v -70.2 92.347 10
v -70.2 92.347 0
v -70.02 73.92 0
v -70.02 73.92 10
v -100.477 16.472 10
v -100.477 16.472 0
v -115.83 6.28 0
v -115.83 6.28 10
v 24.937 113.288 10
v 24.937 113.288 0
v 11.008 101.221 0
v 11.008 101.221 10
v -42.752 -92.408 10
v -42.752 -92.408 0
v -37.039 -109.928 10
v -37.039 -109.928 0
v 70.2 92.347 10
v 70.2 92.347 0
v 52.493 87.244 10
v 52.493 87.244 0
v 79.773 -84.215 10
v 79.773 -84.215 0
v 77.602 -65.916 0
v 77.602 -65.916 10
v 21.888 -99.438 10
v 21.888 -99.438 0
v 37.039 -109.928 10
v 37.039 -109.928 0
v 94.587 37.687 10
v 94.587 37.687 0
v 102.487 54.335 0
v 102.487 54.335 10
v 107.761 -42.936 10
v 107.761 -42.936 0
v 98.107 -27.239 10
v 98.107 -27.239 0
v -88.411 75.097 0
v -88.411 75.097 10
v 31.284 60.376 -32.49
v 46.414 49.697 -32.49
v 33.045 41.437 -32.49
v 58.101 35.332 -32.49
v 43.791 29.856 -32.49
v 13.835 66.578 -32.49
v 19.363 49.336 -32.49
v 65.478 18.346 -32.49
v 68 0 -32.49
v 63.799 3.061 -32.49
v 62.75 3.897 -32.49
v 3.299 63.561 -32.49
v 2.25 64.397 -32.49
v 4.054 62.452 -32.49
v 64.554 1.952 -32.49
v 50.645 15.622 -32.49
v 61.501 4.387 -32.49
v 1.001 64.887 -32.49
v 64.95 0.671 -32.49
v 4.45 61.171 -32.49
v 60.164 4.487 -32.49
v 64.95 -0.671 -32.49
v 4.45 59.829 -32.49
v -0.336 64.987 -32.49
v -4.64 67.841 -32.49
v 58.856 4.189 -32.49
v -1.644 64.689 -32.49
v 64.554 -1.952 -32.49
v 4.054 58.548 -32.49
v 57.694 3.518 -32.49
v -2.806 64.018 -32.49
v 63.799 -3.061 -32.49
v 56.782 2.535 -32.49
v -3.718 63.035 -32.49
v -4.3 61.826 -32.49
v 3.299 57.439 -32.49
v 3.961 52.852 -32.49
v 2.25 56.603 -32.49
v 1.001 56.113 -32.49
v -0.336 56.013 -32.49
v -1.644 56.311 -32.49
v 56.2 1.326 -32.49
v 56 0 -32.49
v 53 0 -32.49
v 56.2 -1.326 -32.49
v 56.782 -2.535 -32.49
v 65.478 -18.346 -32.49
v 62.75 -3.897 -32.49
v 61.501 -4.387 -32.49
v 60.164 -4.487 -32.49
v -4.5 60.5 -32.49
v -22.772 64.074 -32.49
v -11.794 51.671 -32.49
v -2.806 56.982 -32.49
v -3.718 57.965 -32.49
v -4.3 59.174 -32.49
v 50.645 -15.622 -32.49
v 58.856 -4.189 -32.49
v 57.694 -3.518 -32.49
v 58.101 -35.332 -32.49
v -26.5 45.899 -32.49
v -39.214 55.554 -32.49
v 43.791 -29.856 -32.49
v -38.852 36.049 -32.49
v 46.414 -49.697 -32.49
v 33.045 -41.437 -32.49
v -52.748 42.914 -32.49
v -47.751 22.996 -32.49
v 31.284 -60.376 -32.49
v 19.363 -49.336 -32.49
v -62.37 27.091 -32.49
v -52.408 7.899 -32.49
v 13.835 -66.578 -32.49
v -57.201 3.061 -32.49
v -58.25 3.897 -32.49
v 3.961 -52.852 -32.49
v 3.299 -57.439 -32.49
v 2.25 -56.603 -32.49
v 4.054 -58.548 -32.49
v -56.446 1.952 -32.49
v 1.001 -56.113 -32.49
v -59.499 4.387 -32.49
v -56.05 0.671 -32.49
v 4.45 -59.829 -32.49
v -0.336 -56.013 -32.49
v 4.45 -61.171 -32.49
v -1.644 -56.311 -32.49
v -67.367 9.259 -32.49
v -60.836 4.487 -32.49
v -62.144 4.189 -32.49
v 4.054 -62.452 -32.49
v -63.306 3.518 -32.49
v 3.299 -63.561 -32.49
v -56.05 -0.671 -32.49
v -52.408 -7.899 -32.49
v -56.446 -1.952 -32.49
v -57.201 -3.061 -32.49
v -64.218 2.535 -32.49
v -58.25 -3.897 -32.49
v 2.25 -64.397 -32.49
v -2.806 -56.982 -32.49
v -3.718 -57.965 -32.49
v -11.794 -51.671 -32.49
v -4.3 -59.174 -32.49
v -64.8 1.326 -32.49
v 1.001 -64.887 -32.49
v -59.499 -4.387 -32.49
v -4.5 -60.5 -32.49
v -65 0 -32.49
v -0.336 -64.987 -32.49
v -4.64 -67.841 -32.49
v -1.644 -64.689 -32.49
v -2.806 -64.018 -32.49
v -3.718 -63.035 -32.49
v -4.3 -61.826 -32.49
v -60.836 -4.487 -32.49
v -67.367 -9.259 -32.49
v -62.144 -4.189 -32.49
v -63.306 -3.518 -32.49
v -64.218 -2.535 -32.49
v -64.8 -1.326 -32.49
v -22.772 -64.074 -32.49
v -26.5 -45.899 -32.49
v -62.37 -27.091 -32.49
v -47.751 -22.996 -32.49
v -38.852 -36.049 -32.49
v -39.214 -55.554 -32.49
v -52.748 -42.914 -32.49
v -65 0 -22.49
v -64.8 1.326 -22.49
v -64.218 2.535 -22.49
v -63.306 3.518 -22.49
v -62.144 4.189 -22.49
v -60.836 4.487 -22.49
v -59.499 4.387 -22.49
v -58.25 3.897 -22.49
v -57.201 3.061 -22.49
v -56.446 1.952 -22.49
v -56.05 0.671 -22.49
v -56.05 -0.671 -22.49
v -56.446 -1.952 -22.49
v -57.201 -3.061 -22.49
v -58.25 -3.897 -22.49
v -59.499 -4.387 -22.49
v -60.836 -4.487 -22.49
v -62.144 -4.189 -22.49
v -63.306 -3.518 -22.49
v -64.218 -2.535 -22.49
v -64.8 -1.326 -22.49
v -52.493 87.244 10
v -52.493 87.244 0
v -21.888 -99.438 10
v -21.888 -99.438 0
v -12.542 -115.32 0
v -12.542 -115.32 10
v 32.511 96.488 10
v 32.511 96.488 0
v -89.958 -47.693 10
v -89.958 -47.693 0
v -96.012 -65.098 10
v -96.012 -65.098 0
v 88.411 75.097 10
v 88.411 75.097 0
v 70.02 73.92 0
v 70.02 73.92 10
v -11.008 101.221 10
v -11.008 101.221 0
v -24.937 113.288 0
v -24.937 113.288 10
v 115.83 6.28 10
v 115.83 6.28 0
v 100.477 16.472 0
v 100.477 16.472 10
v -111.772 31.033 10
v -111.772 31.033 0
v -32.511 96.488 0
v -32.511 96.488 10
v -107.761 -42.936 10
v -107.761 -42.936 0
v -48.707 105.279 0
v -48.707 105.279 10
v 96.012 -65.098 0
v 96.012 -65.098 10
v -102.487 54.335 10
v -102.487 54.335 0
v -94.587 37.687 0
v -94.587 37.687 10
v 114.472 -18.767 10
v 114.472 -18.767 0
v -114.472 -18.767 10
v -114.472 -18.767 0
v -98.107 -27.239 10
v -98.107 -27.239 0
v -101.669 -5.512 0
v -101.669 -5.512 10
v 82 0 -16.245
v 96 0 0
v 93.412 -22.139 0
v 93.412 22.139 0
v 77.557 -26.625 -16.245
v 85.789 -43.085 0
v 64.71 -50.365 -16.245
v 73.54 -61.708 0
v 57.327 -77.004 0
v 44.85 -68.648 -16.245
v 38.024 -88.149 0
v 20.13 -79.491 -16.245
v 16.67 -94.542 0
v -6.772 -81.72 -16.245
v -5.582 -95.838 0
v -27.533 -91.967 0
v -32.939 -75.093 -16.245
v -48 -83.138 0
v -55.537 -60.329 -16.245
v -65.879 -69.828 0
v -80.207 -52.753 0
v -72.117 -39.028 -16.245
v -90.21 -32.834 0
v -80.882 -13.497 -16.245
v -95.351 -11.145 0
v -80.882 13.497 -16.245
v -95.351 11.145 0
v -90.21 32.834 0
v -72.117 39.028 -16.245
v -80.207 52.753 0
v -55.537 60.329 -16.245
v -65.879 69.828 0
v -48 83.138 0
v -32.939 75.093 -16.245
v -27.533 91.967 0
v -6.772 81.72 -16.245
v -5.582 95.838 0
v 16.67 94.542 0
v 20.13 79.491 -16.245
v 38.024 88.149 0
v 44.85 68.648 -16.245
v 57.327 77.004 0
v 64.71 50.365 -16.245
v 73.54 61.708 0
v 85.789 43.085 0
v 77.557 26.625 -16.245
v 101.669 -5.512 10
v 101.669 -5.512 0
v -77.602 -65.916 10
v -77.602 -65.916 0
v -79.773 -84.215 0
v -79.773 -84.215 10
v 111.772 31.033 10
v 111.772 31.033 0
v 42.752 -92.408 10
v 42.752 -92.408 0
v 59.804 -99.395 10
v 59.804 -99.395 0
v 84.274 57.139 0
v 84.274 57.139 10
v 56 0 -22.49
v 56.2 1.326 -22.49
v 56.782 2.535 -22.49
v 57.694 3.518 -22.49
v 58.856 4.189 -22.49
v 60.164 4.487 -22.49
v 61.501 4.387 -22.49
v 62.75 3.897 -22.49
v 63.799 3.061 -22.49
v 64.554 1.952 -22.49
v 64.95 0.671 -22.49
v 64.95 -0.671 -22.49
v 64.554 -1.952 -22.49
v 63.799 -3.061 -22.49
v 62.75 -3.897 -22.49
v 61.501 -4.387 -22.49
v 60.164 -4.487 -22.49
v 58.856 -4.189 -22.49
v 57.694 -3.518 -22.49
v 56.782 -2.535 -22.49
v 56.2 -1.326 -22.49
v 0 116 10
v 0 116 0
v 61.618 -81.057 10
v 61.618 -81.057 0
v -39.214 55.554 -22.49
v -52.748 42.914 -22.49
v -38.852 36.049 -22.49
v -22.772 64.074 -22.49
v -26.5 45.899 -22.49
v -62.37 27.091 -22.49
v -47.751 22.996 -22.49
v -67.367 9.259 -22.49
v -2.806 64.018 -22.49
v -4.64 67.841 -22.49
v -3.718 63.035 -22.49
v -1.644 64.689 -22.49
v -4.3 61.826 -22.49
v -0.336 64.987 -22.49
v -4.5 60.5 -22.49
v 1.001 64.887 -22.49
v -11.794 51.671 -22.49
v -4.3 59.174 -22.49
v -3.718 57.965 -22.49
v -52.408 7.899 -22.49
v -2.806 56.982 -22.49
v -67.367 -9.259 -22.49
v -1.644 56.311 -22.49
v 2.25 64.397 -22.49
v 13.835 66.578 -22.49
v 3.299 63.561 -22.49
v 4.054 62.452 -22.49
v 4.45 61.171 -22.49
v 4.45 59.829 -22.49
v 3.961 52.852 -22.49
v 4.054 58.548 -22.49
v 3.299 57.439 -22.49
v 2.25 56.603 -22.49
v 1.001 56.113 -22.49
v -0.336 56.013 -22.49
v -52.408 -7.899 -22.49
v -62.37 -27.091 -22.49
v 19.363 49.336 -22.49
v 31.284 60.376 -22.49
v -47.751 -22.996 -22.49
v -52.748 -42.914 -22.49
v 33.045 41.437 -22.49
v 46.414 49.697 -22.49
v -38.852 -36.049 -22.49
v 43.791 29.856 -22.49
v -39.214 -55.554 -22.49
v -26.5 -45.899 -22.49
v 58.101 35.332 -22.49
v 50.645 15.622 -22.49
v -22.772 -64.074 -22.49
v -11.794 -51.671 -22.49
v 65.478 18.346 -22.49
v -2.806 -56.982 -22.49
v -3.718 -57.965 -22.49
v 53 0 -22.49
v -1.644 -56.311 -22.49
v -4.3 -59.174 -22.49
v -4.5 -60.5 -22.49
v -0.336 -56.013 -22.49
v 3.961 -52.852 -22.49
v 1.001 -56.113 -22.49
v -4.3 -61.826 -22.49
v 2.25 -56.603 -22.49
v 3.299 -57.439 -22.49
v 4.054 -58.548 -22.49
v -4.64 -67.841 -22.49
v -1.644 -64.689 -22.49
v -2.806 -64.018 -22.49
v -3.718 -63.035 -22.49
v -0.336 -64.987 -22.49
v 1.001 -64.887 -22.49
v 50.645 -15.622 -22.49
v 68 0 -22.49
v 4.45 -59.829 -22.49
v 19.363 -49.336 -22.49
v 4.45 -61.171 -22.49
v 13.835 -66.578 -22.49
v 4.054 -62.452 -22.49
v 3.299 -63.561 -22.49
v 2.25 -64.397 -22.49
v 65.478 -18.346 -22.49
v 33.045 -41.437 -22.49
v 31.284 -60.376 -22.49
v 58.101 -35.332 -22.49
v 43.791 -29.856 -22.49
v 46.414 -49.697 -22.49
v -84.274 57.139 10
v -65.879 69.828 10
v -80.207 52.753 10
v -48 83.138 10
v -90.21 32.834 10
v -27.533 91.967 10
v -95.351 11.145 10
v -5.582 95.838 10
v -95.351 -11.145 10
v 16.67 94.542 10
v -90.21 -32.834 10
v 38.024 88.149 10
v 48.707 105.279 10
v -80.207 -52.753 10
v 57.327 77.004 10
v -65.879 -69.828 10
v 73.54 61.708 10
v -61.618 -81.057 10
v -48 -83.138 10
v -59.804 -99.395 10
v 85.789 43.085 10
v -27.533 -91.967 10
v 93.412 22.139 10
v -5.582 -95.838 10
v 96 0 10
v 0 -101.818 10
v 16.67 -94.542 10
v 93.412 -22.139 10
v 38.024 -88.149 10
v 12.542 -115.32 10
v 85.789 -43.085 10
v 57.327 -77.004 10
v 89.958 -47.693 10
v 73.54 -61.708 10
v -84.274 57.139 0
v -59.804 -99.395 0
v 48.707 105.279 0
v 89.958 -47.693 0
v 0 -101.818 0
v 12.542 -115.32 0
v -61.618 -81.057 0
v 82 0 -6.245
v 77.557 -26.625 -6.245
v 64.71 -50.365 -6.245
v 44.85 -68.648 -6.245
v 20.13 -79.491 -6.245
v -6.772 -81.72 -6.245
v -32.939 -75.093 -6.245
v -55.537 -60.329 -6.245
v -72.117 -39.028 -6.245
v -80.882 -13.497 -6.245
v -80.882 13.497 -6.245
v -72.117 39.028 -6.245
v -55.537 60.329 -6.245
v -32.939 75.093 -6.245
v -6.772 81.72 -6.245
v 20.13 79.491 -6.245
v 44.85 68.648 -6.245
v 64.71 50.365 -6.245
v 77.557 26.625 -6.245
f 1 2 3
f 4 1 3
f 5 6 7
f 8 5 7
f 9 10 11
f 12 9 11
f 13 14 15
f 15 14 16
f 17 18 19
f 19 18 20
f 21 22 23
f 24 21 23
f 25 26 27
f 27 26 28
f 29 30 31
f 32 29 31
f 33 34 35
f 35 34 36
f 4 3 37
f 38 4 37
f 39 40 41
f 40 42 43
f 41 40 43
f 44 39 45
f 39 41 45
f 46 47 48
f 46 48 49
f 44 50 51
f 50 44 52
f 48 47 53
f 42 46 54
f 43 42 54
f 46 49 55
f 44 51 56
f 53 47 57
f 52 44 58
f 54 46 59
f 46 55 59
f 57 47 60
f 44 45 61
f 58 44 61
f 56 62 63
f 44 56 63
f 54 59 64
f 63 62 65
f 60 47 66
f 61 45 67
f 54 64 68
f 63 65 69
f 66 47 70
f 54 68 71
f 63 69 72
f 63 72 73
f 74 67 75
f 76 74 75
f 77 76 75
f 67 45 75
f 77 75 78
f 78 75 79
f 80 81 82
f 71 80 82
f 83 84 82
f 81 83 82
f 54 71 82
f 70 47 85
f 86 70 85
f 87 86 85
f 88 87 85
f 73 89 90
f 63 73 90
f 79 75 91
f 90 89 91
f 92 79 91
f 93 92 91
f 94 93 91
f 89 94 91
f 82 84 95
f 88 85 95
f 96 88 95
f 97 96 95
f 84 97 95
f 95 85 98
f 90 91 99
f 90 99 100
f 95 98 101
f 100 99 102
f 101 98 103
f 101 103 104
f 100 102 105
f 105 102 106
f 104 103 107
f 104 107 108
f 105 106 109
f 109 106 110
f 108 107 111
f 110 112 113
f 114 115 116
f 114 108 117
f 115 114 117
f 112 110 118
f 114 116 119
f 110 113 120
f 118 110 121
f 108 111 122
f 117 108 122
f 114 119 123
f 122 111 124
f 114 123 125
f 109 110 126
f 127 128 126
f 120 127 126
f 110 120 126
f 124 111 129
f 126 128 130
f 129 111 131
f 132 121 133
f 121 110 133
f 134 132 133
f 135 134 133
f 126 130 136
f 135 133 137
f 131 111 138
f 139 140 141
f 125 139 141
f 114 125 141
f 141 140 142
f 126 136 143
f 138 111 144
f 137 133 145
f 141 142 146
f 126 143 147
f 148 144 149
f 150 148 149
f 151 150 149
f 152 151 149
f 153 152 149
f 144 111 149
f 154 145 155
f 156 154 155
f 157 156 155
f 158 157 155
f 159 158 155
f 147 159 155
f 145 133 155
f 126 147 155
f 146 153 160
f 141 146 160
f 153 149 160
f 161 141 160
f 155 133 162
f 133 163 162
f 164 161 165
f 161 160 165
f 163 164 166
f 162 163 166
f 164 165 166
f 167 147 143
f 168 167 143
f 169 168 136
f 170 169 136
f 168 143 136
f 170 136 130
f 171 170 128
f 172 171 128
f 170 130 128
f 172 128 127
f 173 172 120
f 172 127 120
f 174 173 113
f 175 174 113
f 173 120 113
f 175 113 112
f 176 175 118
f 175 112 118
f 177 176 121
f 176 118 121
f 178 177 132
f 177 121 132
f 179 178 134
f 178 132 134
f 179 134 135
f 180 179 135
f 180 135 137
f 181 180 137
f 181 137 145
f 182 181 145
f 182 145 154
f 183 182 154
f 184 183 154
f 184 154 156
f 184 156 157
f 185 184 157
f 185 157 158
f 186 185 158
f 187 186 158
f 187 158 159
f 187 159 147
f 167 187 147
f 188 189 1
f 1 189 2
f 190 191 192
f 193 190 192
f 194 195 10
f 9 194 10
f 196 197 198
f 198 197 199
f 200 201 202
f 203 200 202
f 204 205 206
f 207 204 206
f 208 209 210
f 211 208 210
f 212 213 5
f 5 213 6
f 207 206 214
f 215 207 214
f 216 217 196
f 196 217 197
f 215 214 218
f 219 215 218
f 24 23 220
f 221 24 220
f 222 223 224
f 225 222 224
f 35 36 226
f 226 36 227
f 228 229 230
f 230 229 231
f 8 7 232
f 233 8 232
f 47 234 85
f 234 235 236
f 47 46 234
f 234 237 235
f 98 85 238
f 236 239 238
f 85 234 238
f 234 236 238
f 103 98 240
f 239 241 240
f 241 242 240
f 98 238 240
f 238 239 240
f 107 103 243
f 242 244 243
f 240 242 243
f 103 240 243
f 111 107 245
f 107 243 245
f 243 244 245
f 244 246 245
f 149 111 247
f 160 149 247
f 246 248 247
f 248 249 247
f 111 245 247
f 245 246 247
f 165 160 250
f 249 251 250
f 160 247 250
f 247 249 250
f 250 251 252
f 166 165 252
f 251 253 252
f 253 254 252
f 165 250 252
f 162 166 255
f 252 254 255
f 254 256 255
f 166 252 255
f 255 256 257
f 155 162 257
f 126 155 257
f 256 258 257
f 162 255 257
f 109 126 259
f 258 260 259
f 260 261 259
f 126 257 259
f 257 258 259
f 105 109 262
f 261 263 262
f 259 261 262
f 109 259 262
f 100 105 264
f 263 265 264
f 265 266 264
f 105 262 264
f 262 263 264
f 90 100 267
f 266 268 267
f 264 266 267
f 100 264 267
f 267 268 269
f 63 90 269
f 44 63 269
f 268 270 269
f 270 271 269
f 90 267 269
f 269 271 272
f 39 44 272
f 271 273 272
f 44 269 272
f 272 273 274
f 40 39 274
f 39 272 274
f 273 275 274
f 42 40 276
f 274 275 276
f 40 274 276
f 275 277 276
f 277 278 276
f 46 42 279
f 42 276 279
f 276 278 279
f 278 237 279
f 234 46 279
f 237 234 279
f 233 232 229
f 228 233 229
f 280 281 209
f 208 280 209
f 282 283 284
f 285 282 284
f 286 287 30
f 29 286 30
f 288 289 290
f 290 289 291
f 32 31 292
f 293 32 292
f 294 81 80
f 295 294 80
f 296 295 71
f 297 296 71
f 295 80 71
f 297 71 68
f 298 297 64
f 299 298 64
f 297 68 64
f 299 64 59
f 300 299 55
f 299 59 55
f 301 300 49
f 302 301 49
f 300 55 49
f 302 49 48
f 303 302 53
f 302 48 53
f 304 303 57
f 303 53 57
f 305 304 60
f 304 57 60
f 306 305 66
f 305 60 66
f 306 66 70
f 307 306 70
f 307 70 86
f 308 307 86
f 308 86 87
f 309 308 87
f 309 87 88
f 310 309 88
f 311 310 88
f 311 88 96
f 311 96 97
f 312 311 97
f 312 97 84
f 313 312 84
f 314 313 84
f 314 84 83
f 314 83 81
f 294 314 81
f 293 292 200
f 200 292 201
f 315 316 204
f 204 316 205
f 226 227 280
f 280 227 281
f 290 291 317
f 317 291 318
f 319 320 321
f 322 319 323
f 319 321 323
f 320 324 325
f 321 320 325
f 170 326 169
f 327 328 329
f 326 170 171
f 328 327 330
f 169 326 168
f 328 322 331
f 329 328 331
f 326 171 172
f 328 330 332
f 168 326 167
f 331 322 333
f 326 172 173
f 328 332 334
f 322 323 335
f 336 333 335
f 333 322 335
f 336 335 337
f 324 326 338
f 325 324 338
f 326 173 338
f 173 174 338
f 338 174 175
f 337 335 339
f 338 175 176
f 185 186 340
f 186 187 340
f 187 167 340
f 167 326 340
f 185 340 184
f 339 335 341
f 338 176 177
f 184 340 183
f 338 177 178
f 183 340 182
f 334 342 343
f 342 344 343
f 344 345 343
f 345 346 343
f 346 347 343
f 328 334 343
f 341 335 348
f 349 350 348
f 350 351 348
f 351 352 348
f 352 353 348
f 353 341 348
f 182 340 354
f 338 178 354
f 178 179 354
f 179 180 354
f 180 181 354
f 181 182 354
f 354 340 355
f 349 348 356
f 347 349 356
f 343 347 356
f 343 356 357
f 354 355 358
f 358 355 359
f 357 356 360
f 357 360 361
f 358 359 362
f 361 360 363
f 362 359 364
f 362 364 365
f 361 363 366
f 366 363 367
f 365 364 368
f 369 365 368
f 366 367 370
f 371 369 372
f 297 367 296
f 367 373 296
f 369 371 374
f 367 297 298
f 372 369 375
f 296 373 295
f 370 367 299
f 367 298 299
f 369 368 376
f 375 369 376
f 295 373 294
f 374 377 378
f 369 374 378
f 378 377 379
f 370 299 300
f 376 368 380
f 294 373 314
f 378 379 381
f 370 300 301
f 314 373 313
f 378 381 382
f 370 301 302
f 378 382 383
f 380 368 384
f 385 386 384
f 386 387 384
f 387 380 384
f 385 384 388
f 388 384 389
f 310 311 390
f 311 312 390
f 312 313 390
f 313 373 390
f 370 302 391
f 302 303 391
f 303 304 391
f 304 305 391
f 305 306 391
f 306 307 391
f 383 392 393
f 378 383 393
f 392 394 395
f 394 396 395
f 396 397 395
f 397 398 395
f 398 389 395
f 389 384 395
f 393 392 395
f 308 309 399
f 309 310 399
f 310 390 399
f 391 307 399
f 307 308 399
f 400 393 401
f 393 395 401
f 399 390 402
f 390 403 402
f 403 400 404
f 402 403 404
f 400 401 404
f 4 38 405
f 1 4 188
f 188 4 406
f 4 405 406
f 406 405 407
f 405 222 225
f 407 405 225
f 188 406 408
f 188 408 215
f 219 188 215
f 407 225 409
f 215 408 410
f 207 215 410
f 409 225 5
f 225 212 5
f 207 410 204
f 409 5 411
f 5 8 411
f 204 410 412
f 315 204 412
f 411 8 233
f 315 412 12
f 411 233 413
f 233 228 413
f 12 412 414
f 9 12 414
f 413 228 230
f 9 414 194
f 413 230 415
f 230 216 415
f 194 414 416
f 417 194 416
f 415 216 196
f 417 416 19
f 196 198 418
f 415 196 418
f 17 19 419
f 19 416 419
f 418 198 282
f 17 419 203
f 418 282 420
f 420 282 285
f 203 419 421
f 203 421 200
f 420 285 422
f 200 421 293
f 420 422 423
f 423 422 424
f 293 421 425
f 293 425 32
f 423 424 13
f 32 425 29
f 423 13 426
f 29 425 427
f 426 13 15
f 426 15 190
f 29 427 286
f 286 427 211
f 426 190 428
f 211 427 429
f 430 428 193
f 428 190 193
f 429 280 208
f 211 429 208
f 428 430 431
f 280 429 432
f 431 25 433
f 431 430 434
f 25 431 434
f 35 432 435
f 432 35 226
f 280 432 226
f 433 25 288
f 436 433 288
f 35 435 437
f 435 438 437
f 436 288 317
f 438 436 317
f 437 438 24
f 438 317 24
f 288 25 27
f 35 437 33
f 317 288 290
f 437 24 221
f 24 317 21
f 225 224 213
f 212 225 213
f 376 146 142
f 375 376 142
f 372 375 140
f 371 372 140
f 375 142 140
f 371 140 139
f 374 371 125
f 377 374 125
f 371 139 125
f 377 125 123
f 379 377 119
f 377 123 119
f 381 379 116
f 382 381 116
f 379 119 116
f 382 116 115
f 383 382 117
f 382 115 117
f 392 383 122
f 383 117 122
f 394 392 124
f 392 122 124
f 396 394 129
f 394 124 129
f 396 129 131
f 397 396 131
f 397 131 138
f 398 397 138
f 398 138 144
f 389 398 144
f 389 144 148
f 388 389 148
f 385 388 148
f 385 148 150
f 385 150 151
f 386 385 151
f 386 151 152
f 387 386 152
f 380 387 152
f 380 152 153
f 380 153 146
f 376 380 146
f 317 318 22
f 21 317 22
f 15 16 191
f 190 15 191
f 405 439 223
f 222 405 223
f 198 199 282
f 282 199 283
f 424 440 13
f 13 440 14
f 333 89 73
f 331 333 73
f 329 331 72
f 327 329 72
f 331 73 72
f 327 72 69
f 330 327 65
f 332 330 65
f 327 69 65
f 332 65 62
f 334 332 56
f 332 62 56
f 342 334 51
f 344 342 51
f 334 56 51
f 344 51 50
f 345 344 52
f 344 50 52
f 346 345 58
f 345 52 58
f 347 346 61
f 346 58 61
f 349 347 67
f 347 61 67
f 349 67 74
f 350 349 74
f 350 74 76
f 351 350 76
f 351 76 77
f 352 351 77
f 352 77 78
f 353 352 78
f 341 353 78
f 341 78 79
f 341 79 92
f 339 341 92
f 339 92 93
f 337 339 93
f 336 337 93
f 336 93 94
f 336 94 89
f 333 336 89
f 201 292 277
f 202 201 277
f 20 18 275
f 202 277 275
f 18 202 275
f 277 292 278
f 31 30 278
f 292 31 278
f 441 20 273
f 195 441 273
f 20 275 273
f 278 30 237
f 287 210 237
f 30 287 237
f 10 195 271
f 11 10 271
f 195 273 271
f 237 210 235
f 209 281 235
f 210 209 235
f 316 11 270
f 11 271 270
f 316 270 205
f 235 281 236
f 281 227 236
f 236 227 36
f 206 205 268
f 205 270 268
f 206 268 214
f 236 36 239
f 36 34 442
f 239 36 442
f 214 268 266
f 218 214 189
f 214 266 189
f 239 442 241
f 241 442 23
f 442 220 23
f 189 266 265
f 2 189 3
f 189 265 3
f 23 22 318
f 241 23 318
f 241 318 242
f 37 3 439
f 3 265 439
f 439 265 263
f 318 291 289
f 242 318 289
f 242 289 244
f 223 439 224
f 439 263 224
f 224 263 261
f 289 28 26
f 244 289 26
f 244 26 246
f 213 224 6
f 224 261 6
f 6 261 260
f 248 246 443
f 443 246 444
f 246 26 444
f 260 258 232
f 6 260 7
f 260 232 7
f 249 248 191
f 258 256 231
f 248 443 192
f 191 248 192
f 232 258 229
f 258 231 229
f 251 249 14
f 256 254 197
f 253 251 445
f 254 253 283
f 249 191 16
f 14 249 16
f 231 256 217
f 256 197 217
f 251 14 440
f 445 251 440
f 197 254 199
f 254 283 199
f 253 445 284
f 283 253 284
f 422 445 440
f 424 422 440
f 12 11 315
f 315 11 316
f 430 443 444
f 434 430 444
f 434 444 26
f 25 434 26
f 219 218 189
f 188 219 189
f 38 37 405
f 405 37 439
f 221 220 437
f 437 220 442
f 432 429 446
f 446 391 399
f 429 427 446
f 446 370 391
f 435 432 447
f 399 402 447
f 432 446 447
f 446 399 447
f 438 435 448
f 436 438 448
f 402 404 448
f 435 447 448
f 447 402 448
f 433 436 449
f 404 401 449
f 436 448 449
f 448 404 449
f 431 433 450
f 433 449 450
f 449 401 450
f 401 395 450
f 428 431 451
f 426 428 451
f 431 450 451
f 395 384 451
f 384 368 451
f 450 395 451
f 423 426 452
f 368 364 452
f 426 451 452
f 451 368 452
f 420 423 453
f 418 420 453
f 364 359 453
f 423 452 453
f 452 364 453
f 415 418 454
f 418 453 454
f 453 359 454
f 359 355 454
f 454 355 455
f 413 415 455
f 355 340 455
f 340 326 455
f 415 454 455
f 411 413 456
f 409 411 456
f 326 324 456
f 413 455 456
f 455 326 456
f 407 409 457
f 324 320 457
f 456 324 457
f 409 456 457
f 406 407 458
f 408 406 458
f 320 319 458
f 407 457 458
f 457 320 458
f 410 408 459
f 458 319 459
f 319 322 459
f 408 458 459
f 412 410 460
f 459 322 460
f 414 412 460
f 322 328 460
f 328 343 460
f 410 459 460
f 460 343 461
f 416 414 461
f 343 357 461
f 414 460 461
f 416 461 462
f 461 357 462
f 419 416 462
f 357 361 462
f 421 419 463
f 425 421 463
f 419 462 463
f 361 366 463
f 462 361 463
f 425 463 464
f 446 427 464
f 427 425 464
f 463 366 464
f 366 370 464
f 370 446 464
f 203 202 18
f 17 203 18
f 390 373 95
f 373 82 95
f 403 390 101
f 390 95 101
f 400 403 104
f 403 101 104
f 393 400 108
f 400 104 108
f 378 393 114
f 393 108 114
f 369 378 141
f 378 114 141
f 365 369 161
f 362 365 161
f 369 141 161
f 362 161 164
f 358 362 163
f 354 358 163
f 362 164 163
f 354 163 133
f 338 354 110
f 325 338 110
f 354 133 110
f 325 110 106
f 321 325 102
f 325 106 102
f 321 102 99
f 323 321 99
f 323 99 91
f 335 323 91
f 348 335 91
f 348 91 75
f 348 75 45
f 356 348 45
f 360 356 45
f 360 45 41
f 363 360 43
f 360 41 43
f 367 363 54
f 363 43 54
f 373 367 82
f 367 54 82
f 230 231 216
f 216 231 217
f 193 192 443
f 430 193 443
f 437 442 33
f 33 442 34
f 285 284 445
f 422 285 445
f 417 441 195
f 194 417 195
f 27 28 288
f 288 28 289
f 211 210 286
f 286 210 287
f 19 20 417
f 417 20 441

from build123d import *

# Parameters (mm, degrees)
BOSS_EXTRU_1_DEPTH           = 10
R_P_TITION_CIRCULAIRE1_COUNT = 29
ESQUISSE3_R                  = 100
ENL_V_MAT_EXTRU_1_DEPTH      = 165.2332493
D_GAGEMENT_M81_D             = 9


with BuildPart() as part:
    # Esquisse1 → Boss.-Extru.1 (new body)
    with BuildSketch(Plane.XY):
        Polygon((-11.173395042, 101), (0, 0), (11.173395042, 101), (0, 116), align=None)
    extrude(amount=BOSS_EXTRU_1_DEPTH)


with BuildPart() as r_p_tition_circulaire1_1:
    # Répétition circulaire1: pattern copy
    add(part.part.rotate(Axis((0, 0, 0), (0, 0, 1)), 1 * 360 / R_P_TITION_CIRCULAIRE1_COUNT))


with BuildPart() as r_p_tition_circulaire1_2:
    # Répétition circulaire1: pattern copy
    add(part.part.rotate(Axis((0, 0, 0), (0, 0, 1)), 2 * 360 / R_P_TITION_CIRCULAIRE1_COUNT))


with BuildPart() as r_p_tition_circulaire1_3:
    # Répétition circulaire1: pattern copy
    add(part.part.rotate(Axis((0, 0, 0), (0, 0, 1)), 3 * 360 / R_P_TITION_CIRCULAIRE1_COUNT))


with BuildPart() as r_p_tition_circulaire1_4:
    # Répétition circulaire1: pattern copy
    add(part.part.rotate(Axis((0, 0, 0), (0, 0, 1)), 4 * 360 / R_P_TITION_CIRCULAIRE1_COUNT))


with BuildPart() as r_p_tition_circulaire1_5:
    # Répétition circulaire1: pattern copy
    add(part.part.rotate(Axis((0, 0, 0), (0, 0, 1)), 5 * 360 / R_P_TITION_CIRCULAIRE1_COUNT))


with BuildPart() as r_p_tition_circulaire1_6:
    # Répétition circulaire1: pattern copy
    add(part.part.rotate(Axis((0, 0, 0), (0, 0, 1)), 6 * 360 / R_P_TITION_CIRCULAIRE1_COUNT))


with BuildPart() as r_p_tition_circulaire1_7:
    # Répétition circulaire1: pattern copy
    add(part.part.rotate(Axis((0, 0, 0), (0, 0, 1)), 7 * 360 / R_P_TITION_CIRCULAIRE1_COUNT))


with BuildPart() as r_p_tition_circulaire1_8:
    # Répétition circulaire1: pattern copy
    add(part.part.rotate(Axis((0, 0, 0), (0, 0, 1)), 8 * 360 / R_P_TITION_CIRCULAIRE1_COUNT))


with BuildPart() as r_p_tition_circulaire1_9:
    # Répétition circulaire1: pattern copy
    add(part.part.rotate(Axis((0, 0, 0), (0, 0, 1)), 9 * 360 / R_P_TITION_CIRCULAIRE1_COUNT))


with BuildPart() as r_p_tition_circulaire1_10:
    # Répétition circulaire1: pattern copy
    add(part.part.rotate(Axis((0, 0, 0), (0, 0, 1)), 10 * 360 / R_P_TITION_CIRCULAIRE1_COUNT))


with BuildPart() as r_p_tition_circulaire1_11:
    # Répétition circulaire1: pattern copy
    add(part.part.rotate(Axis((0, 0, 0), (0, 0, 1)), 11 * 360 / R_P_TITION_CIRCULAIRE1_COUNT))


with BuildPart() as r_p_tition_circulaire1_12:
    # Répétition circulaire1: pattern copy
    add(part.part.rotate(Axis((0, 0, 0), (0, 0, 1)), 12 * 360 / R_P_TITION_CIRCULAIRE1_COUNT))


with BuildPart() as r_p_tition_circulaire1_13:
    # Répétition circulaire1: pattern copy
    add(part.part.rotate(Axis((0, 0, 0), (0, 0, 1)), 13 * 360 / R_P_TITION_CIRCULAIRE1_COUNT))


with BuildPart() as r_p_tition_circulaire1_14:
    # Répétition circulaire1: pattern copy
    add(part.part.rotate(Axis((0, 0, 0), (0, 0, 1)), 14 * 360 / R_P_TITION_CIRCULAIRE1_COUNT))


with BuildPart() as r_p_tition_circulaire1_15:
    # Répétition circulaire1: pattern copy
    add(part.part.rotate(Axis((0, 0, 0), (0, 0, 1)), 15 * 360 / R_P_TITION_CIRCULAIRE1_COUNT))


with BuildPart() as r_p_tition_circulaire1_16:
    # Répétition circulaire1: pattern copy
    add(part.part.rotate(Axis((0, 0, 0), (0, 0, 1)), 16 * 360 / R_P_TITION_CIRCULAIRE1_COUNT))


with BuildPart() as r_p_tition_circulaire1_17:
    # Répétition circulaire1: pattern copy
    add(part.part.rotate(Axis((0, 0, 0), (0, 0, 1)), 17 * 360 / R_P_TITION_CIRCULAIRE1_COUNT))


with BuildPart() as r_p_tition_circulaire1_18:
    # Répétition circulaire1: pattern copy
    add(part.part.rotate(Axis((0, 0, 0), (0, 0, 1)), 18 * 360 / R_P_TITION_CIRCULAIRE1_COUNT))


with BuildPart() as r_p_tition_circulaire1_19:
    # Répétition circulaire1: pattern copy
    add(part.part.rotate(Axis((0, 0, 0), (0, 0, 1)), 19 * 360 / R_P_TITION_CIRCULAIRE1_COUNT))


with BuildPart() as r_p_tition_circulaire1_20:
    # Répétition circulaire1: pattern copy
    add(part.part.rotate(Axis((0, 0, 0), (0, 0, 1)), 20 * 360 / R_P_TITION_CIRCULAIRE1_COUNT))


with BuildPart() as r_p_tition_circulaire1_21:
    # Répétition circulaire1: pattern copy
    add(part.part.rotate(Axis((0, 0, 0), (0, 0, 1)), 21 * 360 / R_P_TITION_CIRCULAIRE1_COUNT))


with BuildPart() as r_p_tition_circulaire1_22:
    # Répétition circulaire1: pattern copy
    add(part.part.rotate(Axis((0, 0, 0), (0, 0, 1)), 22 * 360 / R_P_TITION_CIRCULAIRE1_COUNT))


with BuildPart() as r_p_tition_circulaire1_23:
    # Répétition circulaire1: pattern copy
    add(part.part.rotate(Axis((0, 0, 0), (0, 0, 1)), 23 * 360 / R_P_TITION_CIRCULAIRE1_COUNT))


with BuildPart() as r_p_tition_circulaire1_24:
    # Répétition circulaire1: pattern copy
    add(part.part.rotate(Axis((0, 0, 0), (0, 0, 1)), 24 * 360 / R_P_TITION_CIRCULAIRE1_COUNT))


with BuildPart() as r_p_tition_circulaire1_25:
    # Répétition circulaire1: pattern copy
    add(part.part.rotate(Axis((0, 0, 0), (0, 0, 1)), 25 * 360 / R_P_TITION_CIRCULAIRE1_COUNT))


with BuildPart() as r_p_tition_circulaire1_26:
    # Répétition circulaire1: pattern copy
    add(part.part.rotate(Axis((0, 0, 0), (0, 0, 1)), 26 * 360 / R_P_TITION_CIRCULAIRE1_COUNT))


with BuildPart() as r_p_tition_circulaire1_27:
    # Répétition circulaire1: pattern copy
    add(part.part.rotate(Axis((0, 0, 0), (0, 0, 1)), 27 * 360 / R_P_TITION_CIRCULAIRE1_COUNT))


with BuildPart() as r_p_tition_circulaire1_28:
    # Répétition circulaire1: pattern copy
    add(part.part.rotate(Axis((0, 0, 0), (0, 0, 1)), 28 * 360 / R_P_TITION_CIRCULAIRE1_COUNT))


with BuildPart() as enl_v_mat_extru_1_tool:
    # Esquisse3 → Enlèv. mat.-Extru.1 (new, through all)
    with BuildSketch(Plane.XY):
        Circle(ESQUISSE3_R)
    extrude(amount=ENL_V_MAT_EXTRU_1_DEPTH)


with BuildPart() as part_1:
    add(part.part)

    # Enlèv. mat.-Extru.1: cut by enl_v_mat_extru_1_tool
    add(enl_v_mat_extru_1_tool.part, mode=Mode.SUBTRACT)



with BuildPart() as r_p_tition_circulaire1_1_1:
    add(r_p_tition_circulaire1_1.part)

    # Enlèv. mat.-Extru.1: cut by enl_v_mat_extru_1_tool
    add(enl_v_mat_extru_1_tool.part, mode=Mode.SUBTRACT)


with BuildPart() as r_p_tition_circulaire1_2_1:
    add(r_p_tition_circulaire1_2.part)

    # Enlèv. mat.-Extru.1: cut by enl_v_mat_extru_1_tool
    add(enl_v_mat_extru_1_tool.part, mode=Mode.SUBTRACT)


with BuildPart() as r_p_tition_circulaire1_3_1:
    add(r_p_tition_circulaire1_3.part)

    # Enlèv. mat.-Extru.1: cut by enl_v_mat_extru_1_tool
    add(enl_v_mat_extru_1_tool.part, mode=Mode.SUBTRACT)


with BuildPart() as r_p_tition_circulaire1_4_1:
    add(r_p_tition_circulaire1_4.part)

    # Enlèv. mat.-Extru.1: cut by enl_v_mat_extru_1_tool
    add(enl_v_mat_extru_1_tool.part, mode=Mode.SUBTRACT)


with BuildPart() as r_p_tition_circulaire1_5_1:
    add(r_p_tition_circulaire1_5.part)

    # Enlèv. mat.-Extru.1: cut by enl_v_mat_extru_1_tool
    add(enl_v_mat_extru_1_tool.part, mode=Mode.SUBTRACT)


with BuildPart() as r_p_tition_circulaire1_6_1:
    add(r_p_tition_circulaire1_6.part)

    # Enlèv. mat.-Extru.1: cut by enl_v_mat_extru_1_tool
    add(enl_v_mat_extru_1_tool.part, mode=Mode.SUBTRACT)


with BuildPart() as r_p_tition_circulaire1_7_1:
    add(r_p_tition_circulaire1_7.part)

    # Enlèv. mat.-Extru.1: cut by enl_v_mat_extru_1_tool
    add(enl_v_mat_extru_1_tool.part, mode=Mode.SUBTRACT)


with BuildPart() as r_p_tition_circulaire1_8_1:
    add(r_p_tition_circulaire1_8.part)

    # Enlèv. mat.-Extru.1: cut by enl_v_mat_extru_1_tool
    add(enl_v_mat_extru_1_tool.part, mode=Mode.SUBTRACT)


with BuildPart() as r_p_tition_circulaire1_9_1:
    add(r_p_tition_circulaire1_9.part)

    # Enlèv. mat.-Extru.1: cut by enl_v_mat_extru_1_tool
    add(enl_v_mat_extru_1_tool.part, mode=Mode.SUBTRACT)


with BuildPart() as r_p_tition_circulaire1_10_1:
    add(r_p_tition_circulaire1_10.part)

    # Enlèv. mat.-Extru.1: cut by enl_v_mat_extru_1_tool
    add(enl_v_mat_extru_1_tool.part, mode=Mode.SUBTRACT)


with BuildPart() as r_p_tition_circulaire1_11_1:
    add(r_p_tition_circulaire1_11.part)

    # Enlèv. mat.-Extru.1: cut by enl_v_mat_extru_1_tool
    add(enl_v_mat_extru_1_tool.part, mode=Mode.SUBTRACT)


with BuildPart() as r_p_tition_circulaire1_12_1:
    add(r_p_tition_circulaire1_12.part)

    # Enlèv. mat.-Extru.1: cut by enl_v_mat_extru_1_tool
    add(enl_v_mat_extru_1_tool.part, mode=Mode.SUBTRACT)


with BuildPart() as r_p_tition_circulaire1_13_1:
    add(r_p_tition_circulaire1_13.part)

    # Enlèv. mat.-Extru.1: cut by enl_v_mat_extru_1_tool
    add(enl_v_mat_extru_1_tool.part, mode=Mode.SUBTRACT)


with BuildPart() as r_p_tition_circulaire1_14_1:
    add(r_p_tition_circulaire1_14.part)

    # Enlèv. mat.-Extru.1: cut by enl_v_mat_extru_1_tool
    add(enl_v_mat_extru_1_tool.part, mode=Mode.SUBTRACT)


with BuildPart() as r_p_tition_circulaire1_15_1:
    add(r_p_tition_circulaire1_15.part)

    # Enlèv. mat.-Extru.1: cut by enl_v_mat_extru_1_tool
    add(enl_v_mat_extru_1_tool.part, mode=Mode.SUBTRACT)


with BuildPart() as r_p_tition_circulaire1_16_1:
    add(r_p_tition_circulaire1_16.part)

    # Enlèv. mat.-Extru.1: cut by enl_v_mat_extru_1_tool
    add(enl_v_mat_extru_1_tool.part, mode=Mode.SUBTRACT)


with BuildPart() as r_p_tition_circulaire1_17_1:
    add(r_p_tition_circulaire1_17.part)

    # Enlèv. mat.-Extru.1: cut by enl_v_mat_extru_1_tool
    add(enl_v_mat_extru_1_tool.part, mode=Mode.SUBTRACT)


with BuildPart() as r_p_tition_circulaire1_18_1:
    add(r_p_tition_circulaire1_18.part)

    # Enlèv. mat.-Extru.1: cut by enl_v_mat_extru_1_tool
    add(enl_v_mat_extru_1_tool.part, mode=Mode.SUBTRACT)


with BuildPart() as r_p_tition_circulaire1_19_1:
    add(r_p_tition_circulaire1_19.part)

    # Enlèv. mat.-Extru.1: cut by enl_v_mat_extru_1_tool
    add(enl_v_mat_extru_1_tool.part, mode=Mode.SUBTRACT)


with BuildPart() as r_p_tition_circulaire1_20_1:
    add(r_p_tition_circulaire1_20.part)

    # Enlèv. mat.-Extru.1: cut by enl_v_mat_extru_1_tool
    add(enl_v_mat_extru_1_tool.part, mode=Mode.SUBTRACT)


with BuildPart() as r_p_tition_circulaire1_21_1:
    add(r_p_tition_circulaire1_21.part)

    # Enlèv. mat.-Extru.1: cut by enl_v_mat_extru_1_tool
    add(enl_v_mat_extru_1_tool.part, mode=Mode.SUBTRACT)


with BuildPart() as r_p_tition_circulaire1_22_1:
    add(r_p_tition_circulaire1_22.part)

    # Enlèv. mat.-Extru.1: cut by enl_v_mat_extru_1_tool
    add(enl_v_mat_extru_1_tool.part, mode=Mode.SUBTRACT)


with BuildPart() as r_p_tition_circulaire1_23_1:
    add(r_p_tition_circulaire1_23.part)

    # Enlèv. mat.-Extru.1: cut by enl_v_mat_extru_1_tool
    add(enl_v_mat_extru_1_tool.part, mode=Mode.SUBTRACT)


with BuildPart() as r_p_tition_circulaire1_24_1:
    add(r_p_tition_circulaire1_24.part)

    # Enlèv. mat.-Extru.1: cut by enl_v_mat_extru_1_tool
    add(enl_v_mat_extru_1_tool.part, mode=Mode.SUBTRACT)


with BuildPart() as r_p_tition_circulaire1_25_1:
    add(r_p_tition_circulaire1_25.part)

    # Enlèv. mat.-Extru.1: cut by enl_v_mat_extru_1_tool
    add(enl_v_mat_extru_1_tool.part, mode=Mode.SUBTRACT)


with BuildPart() as r_p_tition_circulaire1_26_1:
    add(r_p_tition_circulaire1_26.part)

    # Enlèv. mat.-Extru.1: cut by enl_v_mat_extru_1_tool
    add(enl_v_mat_extru_1_tool.part, mode=Mode.SUBTRACT)


with BuildPart() as r_p_tition_circulaire1_27_1:
    add(r_p_tition_circulaire1_27.part)

    # Enlèv. mat.-Extru.1: cut by enl_v_mat_extru_1_tool
    add(enl_v_mat_extru_1_tool.part, mode=Mode.SUBTRACT)


with BuildPart() as r_p_tition_circulaire1_28_1:
    add(r_p_tition_circulaire1_28.part)

    # Enlèv. mat.-Extru.1: cut by enl_v_mat_extru_1_tool
    add(enl_v_mat_extru_1_tool.part, mode=Mode.SUBTRACT)


with BuildPart() as part_2:
    add(part_1.part)

    add(r_p_tition_circulaire1_1_1.part)  # Révolution1 merges Répétition circulaire1_1

    add(r_p_tition_circulaire1_2_1.part)  # Révolution1 merges Répétition circulaire1_2

    add(r_p_tition_circulaire1_3_1.part)  # Révolution1 merges Répétition circulaire1_3

    add(r_p_tition_circulaire1_4_1.part)  # Révolution1 merges Répétition circulaire1_4

    add(r_p_tition_circulaire1_5_1.part)  # Révolution1 merges Répétition circulaire1_5

    add(r_p_tition_circulaire1_6_1.part)  # Révolution1 merges Répétition circulaire1_6

    add(r_p_tition_circulaire1_7_1.part)  # Révolution1 merges Répétition circulaire1_7

    add(r_p_tition_circulaire1_8_1.part)  # Révolution1 merges Répétition circulaire1_8

    add(r_p_tition_circulaire1_9_1.part)  # Révolution1 merges Répétition circulaire1_9

    add(r_p_tition_circulaire1_10_1.part)  # Révolution1 merges Répétition circulaire1_10

    add(r_p_tition_circulaire1_11_1.part)  # Révolution1 merges Répétition circulaire1_11

    add(r_p_tition_circulaire1_12_1.part)  # Révolution1 merges Répétition circulaire1_12

    add(r_p_tition_circulaire1_13_1.part)  # Révolution1 merges Répétition circulaire1_13

    add(r_p_tition_circulaire1_14_1.part)  # Révolution1 merges Répétition circulaire1_14

    add(r_p_tition_circulaire1_15_1.part)  # Révolution1 merges Répétition circulaire1_15

    add(r_p_tition_circulaire1_16_1.part)  # Révolution1 merges Répétition circulaire1_16

    add(r_p_tition_circulaire1_17_1.part)  # Révolution1 merges Répétition circulaire1_17

    add(r_p_tition_circulaire1_18_1.part)  # Révolution1 merges Répétition circulaire1_18

    add(r_p_tition_circulaire1_19_1.part)  # Révolution1 merges Répétition circulaire1_19

    add(r_p_tition_circulaire1_20_1.part)  # Révolution1 merges Répétition circulaire1_20

    add(r_p_tition_circulaire1_21_1.part)  # Révolution1 merges Répétition circulaire1_21

    add(r_p_tition_circulaire1_22_1.part)  # Révolution1 merges Répétition circulaire1_22

    add(r_p_tition_circulaire1_23_1.part)  # Révolution1 merges Répétition circulaire1_23

    add(r_p_tition_circulaire1_24_1.part)  # Révolution1 merges Répétition circulaire1_24

    add(r_p_tition_circulaire1_25_1.part)  # Révolution1 merges Répétition circulaire1_25

    add(r_p_tition_circulaire1_26_1.part)  # Révolution1 merges Répétition circulaire1_26

    add(r_p_tition_circulaire1_27_1.part)  # Révolution1 merges Répétition circulaire1_27

    add(r_p_tition_circulaire1_28_1.part)  # Révolution1 merges Répétition circulaire1_28
    # Esquisse4 → Révolution1 (revolve)
    with BuildSketch(Plane(origin=(0, 0, 0), x_dir=(0, 0, -1), z_dir=(1, 0, 0)), mode=Mode.PRIVATE) as r_volution1_sk:
        Polygon((22.49, 53), (32.49, 53), (32.49, 68), (0, 96), (0, 101), (-10, 101), (-10, 96), (22.49, 68), align=None)
    revolve(r_volution1_sk.sketch.rotate(Axis((0, 0, 61.073575306), (0, 0, -1)), 90), axis=Axis((0, 0, 61.073575306), (0, 0, -1)))

    # Dégagement M81 (through all)
    with Locations(Plane.XY.offset(-22.49)):
        with Locations((0, 60.5), (60.5, 0), (0, -60.5), (-60.5, 0)):
            Hole(D_GAGEMENT_M81_D / 2)


solid = part_2.part
